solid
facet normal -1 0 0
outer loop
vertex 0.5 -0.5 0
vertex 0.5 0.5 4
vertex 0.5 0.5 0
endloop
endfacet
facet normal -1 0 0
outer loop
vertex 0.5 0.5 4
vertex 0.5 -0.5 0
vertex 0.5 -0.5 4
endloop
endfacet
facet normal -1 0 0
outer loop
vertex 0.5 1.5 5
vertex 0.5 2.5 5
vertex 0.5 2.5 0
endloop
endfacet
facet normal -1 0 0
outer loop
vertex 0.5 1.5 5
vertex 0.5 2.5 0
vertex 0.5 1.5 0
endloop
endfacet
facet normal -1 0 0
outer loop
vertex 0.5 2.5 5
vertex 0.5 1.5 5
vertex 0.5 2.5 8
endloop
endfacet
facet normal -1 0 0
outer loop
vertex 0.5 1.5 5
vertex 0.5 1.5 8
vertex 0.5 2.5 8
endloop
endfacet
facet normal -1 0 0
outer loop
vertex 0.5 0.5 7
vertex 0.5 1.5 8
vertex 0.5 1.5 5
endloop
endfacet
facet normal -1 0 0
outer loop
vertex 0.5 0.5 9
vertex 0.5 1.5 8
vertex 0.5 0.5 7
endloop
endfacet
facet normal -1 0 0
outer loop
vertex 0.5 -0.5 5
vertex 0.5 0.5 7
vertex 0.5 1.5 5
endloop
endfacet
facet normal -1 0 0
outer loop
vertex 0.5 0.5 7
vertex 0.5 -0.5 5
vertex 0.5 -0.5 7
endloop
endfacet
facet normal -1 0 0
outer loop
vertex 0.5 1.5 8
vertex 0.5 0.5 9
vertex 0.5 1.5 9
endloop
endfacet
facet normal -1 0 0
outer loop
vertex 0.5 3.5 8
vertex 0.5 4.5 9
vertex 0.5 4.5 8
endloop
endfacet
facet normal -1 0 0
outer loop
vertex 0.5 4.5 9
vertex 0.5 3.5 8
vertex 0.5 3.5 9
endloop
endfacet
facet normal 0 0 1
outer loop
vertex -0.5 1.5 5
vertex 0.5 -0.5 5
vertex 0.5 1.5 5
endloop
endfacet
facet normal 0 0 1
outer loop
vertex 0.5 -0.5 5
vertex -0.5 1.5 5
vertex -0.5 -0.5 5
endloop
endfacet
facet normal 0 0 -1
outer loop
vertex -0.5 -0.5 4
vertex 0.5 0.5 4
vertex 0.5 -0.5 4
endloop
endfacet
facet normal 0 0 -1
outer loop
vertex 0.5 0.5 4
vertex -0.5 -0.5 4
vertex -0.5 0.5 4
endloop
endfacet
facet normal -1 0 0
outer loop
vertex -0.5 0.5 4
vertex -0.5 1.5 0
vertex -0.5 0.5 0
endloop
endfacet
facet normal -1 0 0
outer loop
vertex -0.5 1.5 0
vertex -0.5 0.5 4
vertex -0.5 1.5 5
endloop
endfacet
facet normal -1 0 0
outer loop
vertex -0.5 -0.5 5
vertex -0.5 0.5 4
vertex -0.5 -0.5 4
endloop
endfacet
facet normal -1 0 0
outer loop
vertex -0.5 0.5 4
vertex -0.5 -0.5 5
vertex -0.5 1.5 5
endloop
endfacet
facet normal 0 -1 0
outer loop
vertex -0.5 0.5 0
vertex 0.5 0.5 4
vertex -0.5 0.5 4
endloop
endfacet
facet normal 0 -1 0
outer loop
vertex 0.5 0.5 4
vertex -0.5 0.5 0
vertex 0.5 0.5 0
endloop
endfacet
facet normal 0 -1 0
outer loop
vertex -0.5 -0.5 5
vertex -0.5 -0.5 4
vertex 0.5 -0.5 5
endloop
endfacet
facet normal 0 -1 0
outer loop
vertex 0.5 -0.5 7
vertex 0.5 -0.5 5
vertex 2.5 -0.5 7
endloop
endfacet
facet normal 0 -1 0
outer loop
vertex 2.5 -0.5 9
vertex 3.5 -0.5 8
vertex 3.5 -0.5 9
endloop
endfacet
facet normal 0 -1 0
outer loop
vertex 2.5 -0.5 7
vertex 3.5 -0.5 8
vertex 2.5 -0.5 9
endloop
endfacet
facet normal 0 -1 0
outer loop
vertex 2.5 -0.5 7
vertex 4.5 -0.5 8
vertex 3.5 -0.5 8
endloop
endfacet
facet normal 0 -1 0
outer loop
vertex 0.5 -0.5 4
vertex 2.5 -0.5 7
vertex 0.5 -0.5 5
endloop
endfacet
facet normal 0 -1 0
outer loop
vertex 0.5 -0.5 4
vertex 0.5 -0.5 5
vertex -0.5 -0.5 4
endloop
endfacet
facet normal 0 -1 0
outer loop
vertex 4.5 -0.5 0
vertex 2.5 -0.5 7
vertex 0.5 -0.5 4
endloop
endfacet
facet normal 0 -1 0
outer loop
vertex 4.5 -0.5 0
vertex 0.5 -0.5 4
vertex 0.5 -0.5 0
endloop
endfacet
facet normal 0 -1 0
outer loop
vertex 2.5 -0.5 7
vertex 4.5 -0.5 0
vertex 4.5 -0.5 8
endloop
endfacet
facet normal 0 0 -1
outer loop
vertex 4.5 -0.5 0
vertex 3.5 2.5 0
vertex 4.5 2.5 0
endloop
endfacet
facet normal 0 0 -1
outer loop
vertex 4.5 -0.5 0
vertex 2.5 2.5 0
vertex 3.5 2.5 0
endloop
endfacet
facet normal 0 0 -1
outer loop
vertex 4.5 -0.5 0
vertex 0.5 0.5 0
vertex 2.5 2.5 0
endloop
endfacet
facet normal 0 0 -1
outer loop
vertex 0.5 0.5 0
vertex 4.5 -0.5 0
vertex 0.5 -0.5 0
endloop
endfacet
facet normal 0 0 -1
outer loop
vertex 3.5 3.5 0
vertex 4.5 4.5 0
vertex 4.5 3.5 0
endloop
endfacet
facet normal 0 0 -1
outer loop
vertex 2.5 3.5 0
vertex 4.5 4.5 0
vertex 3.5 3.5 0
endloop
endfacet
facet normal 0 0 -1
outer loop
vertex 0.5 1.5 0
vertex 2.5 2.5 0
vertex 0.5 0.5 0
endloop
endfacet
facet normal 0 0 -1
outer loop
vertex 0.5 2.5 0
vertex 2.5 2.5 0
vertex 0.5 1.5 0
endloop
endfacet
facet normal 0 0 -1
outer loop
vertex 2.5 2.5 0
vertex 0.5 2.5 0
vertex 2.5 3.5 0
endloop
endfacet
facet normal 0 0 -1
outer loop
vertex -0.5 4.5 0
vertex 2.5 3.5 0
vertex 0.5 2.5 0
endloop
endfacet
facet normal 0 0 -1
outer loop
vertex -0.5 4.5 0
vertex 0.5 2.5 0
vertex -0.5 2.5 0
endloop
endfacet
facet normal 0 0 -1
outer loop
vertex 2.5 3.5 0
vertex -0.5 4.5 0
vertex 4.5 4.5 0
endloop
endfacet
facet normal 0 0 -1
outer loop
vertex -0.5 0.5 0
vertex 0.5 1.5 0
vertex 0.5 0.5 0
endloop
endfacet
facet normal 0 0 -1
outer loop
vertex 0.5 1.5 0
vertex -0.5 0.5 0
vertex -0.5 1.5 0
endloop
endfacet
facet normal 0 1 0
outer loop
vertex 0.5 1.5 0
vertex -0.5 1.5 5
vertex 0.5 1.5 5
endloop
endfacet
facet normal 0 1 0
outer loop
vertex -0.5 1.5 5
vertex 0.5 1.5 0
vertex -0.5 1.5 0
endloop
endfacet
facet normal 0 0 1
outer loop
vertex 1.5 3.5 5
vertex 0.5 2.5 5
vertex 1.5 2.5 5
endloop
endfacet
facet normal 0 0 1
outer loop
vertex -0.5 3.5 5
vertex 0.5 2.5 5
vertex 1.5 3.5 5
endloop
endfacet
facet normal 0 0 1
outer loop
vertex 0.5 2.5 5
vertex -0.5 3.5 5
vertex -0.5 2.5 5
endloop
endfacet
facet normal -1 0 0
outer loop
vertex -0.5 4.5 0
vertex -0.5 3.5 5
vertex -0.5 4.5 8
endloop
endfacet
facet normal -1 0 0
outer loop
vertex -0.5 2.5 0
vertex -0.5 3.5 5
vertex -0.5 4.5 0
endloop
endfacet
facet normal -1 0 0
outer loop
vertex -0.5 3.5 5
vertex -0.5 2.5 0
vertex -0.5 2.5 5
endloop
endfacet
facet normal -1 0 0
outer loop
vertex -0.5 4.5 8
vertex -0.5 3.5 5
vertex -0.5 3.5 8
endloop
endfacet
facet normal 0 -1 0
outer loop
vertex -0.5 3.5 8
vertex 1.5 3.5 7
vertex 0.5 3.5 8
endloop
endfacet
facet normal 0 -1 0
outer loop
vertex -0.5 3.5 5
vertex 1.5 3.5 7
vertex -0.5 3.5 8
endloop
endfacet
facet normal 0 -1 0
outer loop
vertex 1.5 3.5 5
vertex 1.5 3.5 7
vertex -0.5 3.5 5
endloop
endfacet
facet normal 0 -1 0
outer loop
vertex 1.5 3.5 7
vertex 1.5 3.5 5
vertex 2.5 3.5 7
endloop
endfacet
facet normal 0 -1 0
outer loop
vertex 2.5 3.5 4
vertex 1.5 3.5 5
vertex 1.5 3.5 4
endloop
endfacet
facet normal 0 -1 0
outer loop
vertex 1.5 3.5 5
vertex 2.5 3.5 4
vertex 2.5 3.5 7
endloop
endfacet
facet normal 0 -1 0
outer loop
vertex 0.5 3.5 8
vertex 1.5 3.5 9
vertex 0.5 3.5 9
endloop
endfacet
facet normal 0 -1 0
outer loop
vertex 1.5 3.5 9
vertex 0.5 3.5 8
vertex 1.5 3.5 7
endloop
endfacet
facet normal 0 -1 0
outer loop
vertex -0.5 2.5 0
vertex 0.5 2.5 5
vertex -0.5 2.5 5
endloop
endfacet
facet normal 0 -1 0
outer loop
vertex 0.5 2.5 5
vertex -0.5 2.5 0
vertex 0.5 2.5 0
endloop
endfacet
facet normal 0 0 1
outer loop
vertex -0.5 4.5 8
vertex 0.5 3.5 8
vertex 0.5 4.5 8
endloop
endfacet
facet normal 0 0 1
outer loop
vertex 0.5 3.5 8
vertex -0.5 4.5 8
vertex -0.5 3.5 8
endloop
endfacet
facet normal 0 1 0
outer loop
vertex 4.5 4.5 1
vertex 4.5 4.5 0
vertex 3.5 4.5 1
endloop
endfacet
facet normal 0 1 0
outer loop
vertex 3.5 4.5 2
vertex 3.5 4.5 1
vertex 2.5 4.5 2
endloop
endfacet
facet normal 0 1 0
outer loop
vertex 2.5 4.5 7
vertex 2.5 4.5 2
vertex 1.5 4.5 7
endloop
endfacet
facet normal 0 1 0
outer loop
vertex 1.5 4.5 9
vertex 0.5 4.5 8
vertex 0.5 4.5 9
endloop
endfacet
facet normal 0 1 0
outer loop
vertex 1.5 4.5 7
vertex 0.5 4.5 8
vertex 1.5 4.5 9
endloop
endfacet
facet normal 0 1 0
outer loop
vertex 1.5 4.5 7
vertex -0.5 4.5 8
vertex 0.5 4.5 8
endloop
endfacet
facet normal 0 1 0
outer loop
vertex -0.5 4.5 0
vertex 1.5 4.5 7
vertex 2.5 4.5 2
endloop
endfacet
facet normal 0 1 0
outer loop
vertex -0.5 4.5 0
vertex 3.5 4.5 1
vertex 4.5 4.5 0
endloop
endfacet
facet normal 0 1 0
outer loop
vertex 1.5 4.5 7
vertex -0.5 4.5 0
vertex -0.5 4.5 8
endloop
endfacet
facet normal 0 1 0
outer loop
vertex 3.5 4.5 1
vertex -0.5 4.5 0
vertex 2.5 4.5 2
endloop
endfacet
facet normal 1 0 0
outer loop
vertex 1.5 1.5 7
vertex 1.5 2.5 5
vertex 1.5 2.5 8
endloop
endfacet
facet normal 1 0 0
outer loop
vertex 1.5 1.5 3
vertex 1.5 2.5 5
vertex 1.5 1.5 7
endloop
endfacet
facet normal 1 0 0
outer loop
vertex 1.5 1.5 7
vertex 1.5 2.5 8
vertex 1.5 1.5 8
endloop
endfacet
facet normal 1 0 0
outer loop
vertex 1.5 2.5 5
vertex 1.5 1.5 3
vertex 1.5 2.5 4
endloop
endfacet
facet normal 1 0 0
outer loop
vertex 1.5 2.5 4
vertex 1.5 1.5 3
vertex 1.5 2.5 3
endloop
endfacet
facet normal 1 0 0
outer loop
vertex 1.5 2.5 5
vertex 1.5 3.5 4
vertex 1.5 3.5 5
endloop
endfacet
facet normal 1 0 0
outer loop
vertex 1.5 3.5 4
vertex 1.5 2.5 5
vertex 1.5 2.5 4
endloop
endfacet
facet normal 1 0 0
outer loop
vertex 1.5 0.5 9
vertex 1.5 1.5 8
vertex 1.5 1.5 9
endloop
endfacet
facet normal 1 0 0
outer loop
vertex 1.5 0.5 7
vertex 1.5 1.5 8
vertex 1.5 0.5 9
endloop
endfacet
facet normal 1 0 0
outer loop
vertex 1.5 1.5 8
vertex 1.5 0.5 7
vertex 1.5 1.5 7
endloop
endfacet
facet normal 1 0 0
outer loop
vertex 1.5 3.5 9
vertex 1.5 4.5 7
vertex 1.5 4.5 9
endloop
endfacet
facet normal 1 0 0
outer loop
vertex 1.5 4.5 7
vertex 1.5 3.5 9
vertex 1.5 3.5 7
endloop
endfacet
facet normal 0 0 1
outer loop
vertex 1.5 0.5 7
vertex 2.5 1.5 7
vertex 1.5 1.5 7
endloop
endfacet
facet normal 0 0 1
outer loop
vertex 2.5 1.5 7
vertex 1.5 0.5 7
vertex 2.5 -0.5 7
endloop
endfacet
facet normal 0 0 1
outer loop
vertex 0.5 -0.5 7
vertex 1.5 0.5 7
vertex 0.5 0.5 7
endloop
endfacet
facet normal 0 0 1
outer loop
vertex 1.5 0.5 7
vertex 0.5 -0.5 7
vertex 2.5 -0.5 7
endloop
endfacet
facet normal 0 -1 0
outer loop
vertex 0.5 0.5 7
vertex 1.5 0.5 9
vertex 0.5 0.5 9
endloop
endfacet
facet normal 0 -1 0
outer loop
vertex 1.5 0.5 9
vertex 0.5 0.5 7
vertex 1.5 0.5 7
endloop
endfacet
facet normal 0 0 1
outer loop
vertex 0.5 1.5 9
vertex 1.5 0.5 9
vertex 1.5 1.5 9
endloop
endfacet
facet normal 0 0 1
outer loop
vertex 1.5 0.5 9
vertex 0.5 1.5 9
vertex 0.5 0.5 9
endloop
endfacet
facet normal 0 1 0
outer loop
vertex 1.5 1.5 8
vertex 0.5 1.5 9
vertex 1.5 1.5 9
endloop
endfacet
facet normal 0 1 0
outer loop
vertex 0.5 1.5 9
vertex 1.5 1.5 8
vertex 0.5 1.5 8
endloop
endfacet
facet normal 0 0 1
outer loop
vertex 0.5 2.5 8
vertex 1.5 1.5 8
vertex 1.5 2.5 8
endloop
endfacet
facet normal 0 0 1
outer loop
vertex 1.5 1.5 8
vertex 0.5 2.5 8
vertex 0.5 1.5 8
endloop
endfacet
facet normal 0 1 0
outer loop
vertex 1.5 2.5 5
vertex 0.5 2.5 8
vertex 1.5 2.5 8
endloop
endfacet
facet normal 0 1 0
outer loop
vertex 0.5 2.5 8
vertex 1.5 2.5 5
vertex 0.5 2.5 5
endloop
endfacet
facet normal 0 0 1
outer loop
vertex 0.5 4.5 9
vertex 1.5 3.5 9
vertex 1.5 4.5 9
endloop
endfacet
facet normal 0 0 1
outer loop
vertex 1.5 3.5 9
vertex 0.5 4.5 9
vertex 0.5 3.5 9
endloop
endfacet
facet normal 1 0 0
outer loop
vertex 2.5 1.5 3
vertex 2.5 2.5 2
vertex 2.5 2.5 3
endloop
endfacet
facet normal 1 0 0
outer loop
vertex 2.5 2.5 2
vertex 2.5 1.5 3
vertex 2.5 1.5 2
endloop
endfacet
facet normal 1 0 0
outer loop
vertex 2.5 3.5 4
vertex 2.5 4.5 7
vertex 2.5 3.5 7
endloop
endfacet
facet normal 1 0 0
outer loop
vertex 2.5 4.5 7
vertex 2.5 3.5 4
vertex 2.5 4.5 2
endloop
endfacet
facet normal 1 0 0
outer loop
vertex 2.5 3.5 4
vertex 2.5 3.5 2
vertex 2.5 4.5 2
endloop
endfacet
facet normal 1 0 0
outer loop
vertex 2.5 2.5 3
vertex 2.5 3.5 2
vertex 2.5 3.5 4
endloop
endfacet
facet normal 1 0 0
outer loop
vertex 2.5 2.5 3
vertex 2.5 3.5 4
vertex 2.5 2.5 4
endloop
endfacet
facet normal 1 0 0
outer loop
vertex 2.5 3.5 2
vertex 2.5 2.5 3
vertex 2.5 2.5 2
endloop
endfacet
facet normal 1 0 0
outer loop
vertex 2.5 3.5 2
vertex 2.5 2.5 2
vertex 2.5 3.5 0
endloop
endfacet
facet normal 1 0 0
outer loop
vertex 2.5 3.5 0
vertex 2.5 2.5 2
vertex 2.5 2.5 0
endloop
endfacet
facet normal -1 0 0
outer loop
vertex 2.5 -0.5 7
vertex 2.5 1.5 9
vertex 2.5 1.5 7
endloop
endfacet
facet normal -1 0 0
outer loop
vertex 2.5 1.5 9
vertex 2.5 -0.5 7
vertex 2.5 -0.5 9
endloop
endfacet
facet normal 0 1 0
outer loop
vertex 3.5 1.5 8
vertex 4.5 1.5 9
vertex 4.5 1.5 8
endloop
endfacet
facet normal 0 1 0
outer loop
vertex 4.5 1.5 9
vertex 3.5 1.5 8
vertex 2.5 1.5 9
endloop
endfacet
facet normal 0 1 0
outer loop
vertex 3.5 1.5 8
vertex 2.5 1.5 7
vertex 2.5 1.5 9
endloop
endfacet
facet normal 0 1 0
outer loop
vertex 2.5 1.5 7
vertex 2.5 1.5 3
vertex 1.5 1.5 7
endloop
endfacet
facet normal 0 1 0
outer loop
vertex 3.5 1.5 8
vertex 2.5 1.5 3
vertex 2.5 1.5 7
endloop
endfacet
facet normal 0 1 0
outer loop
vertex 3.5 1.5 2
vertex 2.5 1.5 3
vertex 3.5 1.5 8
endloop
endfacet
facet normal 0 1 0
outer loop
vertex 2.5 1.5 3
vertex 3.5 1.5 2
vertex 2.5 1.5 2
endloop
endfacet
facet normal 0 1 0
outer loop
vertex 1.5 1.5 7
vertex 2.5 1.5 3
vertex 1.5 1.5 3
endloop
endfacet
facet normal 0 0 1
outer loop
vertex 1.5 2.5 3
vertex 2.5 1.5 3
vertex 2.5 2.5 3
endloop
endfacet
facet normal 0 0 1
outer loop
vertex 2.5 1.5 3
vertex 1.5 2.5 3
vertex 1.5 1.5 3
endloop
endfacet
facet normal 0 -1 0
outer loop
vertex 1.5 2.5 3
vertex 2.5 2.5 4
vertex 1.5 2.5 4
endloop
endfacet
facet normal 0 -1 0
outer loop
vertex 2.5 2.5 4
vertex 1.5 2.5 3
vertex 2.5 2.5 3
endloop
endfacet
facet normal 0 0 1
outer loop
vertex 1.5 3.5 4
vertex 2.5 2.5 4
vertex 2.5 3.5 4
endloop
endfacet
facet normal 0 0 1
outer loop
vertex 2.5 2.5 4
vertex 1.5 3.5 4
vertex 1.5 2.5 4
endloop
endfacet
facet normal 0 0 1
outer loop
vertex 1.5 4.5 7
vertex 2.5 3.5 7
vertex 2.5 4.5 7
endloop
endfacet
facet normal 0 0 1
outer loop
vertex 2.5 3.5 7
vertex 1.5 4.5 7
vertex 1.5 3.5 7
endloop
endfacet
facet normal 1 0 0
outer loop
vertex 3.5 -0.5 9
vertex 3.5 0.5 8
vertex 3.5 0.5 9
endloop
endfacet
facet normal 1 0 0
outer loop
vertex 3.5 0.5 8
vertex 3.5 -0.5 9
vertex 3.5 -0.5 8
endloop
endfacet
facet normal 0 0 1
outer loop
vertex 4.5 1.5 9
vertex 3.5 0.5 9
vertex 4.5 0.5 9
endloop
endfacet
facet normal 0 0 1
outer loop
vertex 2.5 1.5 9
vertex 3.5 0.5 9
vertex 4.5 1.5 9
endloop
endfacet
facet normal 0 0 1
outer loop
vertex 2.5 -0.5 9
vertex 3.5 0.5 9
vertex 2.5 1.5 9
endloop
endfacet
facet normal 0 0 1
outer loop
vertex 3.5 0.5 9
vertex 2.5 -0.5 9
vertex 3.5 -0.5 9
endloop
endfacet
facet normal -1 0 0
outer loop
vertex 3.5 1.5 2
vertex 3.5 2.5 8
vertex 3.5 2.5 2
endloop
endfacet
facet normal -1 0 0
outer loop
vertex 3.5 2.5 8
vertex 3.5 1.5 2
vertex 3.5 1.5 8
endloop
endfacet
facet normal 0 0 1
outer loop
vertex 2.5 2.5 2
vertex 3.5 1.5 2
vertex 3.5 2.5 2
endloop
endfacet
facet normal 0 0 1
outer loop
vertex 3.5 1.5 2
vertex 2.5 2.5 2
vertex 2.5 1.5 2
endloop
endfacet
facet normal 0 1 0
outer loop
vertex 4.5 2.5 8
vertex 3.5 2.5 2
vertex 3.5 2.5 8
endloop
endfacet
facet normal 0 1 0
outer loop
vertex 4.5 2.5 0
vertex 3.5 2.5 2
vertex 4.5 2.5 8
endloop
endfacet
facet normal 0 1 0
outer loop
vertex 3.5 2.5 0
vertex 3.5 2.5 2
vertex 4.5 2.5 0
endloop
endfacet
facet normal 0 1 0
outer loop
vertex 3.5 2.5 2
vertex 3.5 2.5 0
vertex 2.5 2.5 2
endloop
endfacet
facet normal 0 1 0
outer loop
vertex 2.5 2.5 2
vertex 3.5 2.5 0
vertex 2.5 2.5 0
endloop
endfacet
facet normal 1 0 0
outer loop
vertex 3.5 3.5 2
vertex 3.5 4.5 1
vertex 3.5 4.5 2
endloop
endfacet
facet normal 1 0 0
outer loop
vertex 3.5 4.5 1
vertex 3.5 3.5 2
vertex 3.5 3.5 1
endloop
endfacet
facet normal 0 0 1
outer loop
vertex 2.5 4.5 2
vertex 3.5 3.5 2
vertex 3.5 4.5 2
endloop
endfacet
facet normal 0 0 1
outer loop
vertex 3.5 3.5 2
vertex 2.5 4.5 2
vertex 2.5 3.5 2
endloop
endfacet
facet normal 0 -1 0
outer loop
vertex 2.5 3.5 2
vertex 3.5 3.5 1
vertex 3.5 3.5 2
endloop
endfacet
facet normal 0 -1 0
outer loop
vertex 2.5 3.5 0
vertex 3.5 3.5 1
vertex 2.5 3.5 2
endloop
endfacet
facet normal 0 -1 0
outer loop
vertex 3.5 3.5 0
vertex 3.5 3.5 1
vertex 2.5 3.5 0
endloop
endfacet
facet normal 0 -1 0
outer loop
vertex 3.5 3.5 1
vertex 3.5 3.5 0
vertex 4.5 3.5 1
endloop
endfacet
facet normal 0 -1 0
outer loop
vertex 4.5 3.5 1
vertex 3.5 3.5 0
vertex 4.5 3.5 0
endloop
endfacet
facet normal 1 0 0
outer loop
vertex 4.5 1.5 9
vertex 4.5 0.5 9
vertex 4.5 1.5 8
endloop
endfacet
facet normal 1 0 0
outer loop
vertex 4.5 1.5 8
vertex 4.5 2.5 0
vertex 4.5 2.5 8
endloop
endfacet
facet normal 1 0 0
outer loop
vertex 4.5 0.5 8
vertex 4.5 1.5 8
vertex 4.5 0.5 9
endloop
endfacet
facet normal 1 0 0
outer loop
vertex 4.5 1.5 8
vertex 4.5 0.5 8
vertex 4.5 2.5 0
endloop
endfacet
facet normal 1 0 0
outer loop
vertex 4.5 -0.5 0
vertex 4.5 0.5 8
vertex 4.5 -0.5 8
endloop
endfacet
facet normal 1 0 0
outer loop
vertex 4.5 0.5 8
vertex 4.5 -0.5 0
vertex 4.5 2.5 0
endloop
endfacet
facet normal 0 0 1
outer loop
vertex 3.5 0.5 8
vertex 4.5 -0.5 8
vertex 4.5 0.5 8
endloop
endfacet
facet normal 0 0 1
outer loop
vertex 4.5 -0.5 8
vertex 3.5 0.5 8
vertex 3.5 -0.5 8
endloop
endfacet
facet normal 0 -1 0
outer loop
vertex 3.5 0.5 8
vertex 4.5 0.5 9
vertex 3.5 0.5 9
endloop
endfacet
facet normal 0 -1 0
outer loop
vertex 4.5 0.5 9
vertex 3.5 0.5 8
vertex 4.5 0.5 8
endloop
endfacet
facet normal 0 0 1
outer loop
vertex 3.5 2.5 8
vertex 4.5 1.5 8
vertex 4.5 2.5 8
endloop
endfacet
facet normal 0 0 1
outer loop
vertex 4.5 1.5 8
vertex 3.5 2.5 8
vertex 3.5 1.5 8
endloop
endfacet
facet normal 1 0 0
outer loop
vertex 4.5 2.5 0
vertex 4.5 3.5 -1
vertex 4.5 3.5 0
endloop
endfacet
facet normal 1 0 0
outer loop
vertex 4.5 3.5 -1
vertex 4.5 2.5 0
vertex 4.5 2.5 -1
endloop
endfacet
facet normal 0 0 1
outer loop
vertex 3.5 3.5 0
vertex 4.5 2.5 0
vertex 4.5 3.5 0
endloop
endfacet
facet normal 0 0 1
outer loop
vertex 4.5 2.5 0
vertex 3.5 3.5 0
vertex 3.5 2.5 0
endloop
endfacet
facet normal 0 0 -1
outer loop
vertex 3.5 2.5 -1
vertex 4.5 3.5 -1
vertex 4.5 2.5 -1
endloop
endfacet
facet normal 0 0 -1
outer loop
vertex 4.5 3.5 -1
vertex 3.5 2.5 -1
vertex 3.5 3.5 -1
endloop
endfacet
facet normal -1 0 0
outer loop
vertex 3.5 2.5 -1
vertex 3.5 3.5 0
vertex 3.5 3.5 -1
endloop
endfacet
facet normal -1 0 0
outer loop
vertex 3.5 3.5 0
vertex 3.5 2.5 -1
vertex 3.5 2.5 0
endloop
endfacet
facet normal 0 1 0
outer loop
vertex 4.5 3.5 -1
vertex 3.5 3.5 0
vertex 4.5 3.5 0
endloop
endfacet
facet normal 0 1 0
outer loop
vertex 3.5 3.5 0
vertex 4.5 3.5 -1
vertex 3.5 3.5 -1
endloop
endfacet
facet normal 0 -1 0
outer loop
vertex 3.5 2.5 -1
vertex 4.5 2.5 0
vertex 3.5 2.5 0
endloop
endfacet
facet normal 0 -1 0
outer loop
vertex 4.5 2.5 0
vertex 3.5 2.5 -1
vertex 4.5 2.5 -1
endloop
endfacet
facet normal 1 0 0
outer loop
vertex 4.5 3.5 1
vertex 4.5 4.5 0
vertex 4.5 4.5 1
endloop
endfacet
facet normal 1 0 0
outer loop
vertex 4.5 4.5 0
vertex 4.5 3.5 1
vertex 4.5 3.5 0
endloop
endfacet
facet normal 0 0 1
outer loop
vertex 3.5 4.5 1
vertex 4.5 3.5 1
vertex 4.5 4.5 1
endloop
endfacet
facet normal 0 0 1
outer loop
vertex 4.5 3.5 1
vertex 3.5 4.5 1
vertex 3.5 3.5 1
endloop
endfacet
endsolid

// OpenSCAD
union() {
    translate([0, 0, 4.5]) color([1, 0, 0]) cube([1, 1, 1], center=true);
    translate([0, 1, 2.5]) cube([1, 1, 5], center=true);
    translate([0, 3, 2.5]) cube([1, 1, 5], center=true);
    translate([0, 4, 4.0]) cube([1, 1, 8], center=true);
    translate([1, 0, 3.5]) cube([1, 1, 7], center=true);
    translate([1, 1, 4.5]) cube([1, 1, 9], center=true);
    translate([1, 2, 4.0]) cube([1, 1, 8], center=true);
    translate([1, 3, 2.5]) cube([1, 1, 5], center=true);
    translate([1, 4, 4.5]) cube([1, 1, 9], center=true);
    translate([2, 0, 3.5]) cube([1, 1, 7], center=true);
    translate([2, 1, 3.5]) cube([1, 1, 7], center=true);
    translate([2, 2, 1.5]) cube([1, 1, 3], center=true);
    translate([2, 3, 2.0]) cube([1, 1, 4], center=true);
    translate([2, 4, 3.5]) cube([1, 1, 7], center=true);
    translate([3, 0, 4.5]) cube([1, 1, 9], center=true);
    translate([3, 1, 4.5]) cube([1, 1, 9], center=true);
    translate([3, 2, 1.0]) cube([1, 1, 2], center=true);
    translate([3, 4, 1.0]) cube([1, 1, 2], center=true);
    translate([4, 0, 4.0]) cube([1, 1, 8], center=true);
    translate([4, 1, 4.5]) cube([1, 1, 9], center=true);
    translate([4, 2, 4.0]) cube([1, 1, 8], center=true);
    translate([4, 3, -0.5]) color([0, 0, 1]) cube([1, 1, 1], center=true);
    translate([4, 4, 0.5]) cube([1, 1, 1], center=true);
}
